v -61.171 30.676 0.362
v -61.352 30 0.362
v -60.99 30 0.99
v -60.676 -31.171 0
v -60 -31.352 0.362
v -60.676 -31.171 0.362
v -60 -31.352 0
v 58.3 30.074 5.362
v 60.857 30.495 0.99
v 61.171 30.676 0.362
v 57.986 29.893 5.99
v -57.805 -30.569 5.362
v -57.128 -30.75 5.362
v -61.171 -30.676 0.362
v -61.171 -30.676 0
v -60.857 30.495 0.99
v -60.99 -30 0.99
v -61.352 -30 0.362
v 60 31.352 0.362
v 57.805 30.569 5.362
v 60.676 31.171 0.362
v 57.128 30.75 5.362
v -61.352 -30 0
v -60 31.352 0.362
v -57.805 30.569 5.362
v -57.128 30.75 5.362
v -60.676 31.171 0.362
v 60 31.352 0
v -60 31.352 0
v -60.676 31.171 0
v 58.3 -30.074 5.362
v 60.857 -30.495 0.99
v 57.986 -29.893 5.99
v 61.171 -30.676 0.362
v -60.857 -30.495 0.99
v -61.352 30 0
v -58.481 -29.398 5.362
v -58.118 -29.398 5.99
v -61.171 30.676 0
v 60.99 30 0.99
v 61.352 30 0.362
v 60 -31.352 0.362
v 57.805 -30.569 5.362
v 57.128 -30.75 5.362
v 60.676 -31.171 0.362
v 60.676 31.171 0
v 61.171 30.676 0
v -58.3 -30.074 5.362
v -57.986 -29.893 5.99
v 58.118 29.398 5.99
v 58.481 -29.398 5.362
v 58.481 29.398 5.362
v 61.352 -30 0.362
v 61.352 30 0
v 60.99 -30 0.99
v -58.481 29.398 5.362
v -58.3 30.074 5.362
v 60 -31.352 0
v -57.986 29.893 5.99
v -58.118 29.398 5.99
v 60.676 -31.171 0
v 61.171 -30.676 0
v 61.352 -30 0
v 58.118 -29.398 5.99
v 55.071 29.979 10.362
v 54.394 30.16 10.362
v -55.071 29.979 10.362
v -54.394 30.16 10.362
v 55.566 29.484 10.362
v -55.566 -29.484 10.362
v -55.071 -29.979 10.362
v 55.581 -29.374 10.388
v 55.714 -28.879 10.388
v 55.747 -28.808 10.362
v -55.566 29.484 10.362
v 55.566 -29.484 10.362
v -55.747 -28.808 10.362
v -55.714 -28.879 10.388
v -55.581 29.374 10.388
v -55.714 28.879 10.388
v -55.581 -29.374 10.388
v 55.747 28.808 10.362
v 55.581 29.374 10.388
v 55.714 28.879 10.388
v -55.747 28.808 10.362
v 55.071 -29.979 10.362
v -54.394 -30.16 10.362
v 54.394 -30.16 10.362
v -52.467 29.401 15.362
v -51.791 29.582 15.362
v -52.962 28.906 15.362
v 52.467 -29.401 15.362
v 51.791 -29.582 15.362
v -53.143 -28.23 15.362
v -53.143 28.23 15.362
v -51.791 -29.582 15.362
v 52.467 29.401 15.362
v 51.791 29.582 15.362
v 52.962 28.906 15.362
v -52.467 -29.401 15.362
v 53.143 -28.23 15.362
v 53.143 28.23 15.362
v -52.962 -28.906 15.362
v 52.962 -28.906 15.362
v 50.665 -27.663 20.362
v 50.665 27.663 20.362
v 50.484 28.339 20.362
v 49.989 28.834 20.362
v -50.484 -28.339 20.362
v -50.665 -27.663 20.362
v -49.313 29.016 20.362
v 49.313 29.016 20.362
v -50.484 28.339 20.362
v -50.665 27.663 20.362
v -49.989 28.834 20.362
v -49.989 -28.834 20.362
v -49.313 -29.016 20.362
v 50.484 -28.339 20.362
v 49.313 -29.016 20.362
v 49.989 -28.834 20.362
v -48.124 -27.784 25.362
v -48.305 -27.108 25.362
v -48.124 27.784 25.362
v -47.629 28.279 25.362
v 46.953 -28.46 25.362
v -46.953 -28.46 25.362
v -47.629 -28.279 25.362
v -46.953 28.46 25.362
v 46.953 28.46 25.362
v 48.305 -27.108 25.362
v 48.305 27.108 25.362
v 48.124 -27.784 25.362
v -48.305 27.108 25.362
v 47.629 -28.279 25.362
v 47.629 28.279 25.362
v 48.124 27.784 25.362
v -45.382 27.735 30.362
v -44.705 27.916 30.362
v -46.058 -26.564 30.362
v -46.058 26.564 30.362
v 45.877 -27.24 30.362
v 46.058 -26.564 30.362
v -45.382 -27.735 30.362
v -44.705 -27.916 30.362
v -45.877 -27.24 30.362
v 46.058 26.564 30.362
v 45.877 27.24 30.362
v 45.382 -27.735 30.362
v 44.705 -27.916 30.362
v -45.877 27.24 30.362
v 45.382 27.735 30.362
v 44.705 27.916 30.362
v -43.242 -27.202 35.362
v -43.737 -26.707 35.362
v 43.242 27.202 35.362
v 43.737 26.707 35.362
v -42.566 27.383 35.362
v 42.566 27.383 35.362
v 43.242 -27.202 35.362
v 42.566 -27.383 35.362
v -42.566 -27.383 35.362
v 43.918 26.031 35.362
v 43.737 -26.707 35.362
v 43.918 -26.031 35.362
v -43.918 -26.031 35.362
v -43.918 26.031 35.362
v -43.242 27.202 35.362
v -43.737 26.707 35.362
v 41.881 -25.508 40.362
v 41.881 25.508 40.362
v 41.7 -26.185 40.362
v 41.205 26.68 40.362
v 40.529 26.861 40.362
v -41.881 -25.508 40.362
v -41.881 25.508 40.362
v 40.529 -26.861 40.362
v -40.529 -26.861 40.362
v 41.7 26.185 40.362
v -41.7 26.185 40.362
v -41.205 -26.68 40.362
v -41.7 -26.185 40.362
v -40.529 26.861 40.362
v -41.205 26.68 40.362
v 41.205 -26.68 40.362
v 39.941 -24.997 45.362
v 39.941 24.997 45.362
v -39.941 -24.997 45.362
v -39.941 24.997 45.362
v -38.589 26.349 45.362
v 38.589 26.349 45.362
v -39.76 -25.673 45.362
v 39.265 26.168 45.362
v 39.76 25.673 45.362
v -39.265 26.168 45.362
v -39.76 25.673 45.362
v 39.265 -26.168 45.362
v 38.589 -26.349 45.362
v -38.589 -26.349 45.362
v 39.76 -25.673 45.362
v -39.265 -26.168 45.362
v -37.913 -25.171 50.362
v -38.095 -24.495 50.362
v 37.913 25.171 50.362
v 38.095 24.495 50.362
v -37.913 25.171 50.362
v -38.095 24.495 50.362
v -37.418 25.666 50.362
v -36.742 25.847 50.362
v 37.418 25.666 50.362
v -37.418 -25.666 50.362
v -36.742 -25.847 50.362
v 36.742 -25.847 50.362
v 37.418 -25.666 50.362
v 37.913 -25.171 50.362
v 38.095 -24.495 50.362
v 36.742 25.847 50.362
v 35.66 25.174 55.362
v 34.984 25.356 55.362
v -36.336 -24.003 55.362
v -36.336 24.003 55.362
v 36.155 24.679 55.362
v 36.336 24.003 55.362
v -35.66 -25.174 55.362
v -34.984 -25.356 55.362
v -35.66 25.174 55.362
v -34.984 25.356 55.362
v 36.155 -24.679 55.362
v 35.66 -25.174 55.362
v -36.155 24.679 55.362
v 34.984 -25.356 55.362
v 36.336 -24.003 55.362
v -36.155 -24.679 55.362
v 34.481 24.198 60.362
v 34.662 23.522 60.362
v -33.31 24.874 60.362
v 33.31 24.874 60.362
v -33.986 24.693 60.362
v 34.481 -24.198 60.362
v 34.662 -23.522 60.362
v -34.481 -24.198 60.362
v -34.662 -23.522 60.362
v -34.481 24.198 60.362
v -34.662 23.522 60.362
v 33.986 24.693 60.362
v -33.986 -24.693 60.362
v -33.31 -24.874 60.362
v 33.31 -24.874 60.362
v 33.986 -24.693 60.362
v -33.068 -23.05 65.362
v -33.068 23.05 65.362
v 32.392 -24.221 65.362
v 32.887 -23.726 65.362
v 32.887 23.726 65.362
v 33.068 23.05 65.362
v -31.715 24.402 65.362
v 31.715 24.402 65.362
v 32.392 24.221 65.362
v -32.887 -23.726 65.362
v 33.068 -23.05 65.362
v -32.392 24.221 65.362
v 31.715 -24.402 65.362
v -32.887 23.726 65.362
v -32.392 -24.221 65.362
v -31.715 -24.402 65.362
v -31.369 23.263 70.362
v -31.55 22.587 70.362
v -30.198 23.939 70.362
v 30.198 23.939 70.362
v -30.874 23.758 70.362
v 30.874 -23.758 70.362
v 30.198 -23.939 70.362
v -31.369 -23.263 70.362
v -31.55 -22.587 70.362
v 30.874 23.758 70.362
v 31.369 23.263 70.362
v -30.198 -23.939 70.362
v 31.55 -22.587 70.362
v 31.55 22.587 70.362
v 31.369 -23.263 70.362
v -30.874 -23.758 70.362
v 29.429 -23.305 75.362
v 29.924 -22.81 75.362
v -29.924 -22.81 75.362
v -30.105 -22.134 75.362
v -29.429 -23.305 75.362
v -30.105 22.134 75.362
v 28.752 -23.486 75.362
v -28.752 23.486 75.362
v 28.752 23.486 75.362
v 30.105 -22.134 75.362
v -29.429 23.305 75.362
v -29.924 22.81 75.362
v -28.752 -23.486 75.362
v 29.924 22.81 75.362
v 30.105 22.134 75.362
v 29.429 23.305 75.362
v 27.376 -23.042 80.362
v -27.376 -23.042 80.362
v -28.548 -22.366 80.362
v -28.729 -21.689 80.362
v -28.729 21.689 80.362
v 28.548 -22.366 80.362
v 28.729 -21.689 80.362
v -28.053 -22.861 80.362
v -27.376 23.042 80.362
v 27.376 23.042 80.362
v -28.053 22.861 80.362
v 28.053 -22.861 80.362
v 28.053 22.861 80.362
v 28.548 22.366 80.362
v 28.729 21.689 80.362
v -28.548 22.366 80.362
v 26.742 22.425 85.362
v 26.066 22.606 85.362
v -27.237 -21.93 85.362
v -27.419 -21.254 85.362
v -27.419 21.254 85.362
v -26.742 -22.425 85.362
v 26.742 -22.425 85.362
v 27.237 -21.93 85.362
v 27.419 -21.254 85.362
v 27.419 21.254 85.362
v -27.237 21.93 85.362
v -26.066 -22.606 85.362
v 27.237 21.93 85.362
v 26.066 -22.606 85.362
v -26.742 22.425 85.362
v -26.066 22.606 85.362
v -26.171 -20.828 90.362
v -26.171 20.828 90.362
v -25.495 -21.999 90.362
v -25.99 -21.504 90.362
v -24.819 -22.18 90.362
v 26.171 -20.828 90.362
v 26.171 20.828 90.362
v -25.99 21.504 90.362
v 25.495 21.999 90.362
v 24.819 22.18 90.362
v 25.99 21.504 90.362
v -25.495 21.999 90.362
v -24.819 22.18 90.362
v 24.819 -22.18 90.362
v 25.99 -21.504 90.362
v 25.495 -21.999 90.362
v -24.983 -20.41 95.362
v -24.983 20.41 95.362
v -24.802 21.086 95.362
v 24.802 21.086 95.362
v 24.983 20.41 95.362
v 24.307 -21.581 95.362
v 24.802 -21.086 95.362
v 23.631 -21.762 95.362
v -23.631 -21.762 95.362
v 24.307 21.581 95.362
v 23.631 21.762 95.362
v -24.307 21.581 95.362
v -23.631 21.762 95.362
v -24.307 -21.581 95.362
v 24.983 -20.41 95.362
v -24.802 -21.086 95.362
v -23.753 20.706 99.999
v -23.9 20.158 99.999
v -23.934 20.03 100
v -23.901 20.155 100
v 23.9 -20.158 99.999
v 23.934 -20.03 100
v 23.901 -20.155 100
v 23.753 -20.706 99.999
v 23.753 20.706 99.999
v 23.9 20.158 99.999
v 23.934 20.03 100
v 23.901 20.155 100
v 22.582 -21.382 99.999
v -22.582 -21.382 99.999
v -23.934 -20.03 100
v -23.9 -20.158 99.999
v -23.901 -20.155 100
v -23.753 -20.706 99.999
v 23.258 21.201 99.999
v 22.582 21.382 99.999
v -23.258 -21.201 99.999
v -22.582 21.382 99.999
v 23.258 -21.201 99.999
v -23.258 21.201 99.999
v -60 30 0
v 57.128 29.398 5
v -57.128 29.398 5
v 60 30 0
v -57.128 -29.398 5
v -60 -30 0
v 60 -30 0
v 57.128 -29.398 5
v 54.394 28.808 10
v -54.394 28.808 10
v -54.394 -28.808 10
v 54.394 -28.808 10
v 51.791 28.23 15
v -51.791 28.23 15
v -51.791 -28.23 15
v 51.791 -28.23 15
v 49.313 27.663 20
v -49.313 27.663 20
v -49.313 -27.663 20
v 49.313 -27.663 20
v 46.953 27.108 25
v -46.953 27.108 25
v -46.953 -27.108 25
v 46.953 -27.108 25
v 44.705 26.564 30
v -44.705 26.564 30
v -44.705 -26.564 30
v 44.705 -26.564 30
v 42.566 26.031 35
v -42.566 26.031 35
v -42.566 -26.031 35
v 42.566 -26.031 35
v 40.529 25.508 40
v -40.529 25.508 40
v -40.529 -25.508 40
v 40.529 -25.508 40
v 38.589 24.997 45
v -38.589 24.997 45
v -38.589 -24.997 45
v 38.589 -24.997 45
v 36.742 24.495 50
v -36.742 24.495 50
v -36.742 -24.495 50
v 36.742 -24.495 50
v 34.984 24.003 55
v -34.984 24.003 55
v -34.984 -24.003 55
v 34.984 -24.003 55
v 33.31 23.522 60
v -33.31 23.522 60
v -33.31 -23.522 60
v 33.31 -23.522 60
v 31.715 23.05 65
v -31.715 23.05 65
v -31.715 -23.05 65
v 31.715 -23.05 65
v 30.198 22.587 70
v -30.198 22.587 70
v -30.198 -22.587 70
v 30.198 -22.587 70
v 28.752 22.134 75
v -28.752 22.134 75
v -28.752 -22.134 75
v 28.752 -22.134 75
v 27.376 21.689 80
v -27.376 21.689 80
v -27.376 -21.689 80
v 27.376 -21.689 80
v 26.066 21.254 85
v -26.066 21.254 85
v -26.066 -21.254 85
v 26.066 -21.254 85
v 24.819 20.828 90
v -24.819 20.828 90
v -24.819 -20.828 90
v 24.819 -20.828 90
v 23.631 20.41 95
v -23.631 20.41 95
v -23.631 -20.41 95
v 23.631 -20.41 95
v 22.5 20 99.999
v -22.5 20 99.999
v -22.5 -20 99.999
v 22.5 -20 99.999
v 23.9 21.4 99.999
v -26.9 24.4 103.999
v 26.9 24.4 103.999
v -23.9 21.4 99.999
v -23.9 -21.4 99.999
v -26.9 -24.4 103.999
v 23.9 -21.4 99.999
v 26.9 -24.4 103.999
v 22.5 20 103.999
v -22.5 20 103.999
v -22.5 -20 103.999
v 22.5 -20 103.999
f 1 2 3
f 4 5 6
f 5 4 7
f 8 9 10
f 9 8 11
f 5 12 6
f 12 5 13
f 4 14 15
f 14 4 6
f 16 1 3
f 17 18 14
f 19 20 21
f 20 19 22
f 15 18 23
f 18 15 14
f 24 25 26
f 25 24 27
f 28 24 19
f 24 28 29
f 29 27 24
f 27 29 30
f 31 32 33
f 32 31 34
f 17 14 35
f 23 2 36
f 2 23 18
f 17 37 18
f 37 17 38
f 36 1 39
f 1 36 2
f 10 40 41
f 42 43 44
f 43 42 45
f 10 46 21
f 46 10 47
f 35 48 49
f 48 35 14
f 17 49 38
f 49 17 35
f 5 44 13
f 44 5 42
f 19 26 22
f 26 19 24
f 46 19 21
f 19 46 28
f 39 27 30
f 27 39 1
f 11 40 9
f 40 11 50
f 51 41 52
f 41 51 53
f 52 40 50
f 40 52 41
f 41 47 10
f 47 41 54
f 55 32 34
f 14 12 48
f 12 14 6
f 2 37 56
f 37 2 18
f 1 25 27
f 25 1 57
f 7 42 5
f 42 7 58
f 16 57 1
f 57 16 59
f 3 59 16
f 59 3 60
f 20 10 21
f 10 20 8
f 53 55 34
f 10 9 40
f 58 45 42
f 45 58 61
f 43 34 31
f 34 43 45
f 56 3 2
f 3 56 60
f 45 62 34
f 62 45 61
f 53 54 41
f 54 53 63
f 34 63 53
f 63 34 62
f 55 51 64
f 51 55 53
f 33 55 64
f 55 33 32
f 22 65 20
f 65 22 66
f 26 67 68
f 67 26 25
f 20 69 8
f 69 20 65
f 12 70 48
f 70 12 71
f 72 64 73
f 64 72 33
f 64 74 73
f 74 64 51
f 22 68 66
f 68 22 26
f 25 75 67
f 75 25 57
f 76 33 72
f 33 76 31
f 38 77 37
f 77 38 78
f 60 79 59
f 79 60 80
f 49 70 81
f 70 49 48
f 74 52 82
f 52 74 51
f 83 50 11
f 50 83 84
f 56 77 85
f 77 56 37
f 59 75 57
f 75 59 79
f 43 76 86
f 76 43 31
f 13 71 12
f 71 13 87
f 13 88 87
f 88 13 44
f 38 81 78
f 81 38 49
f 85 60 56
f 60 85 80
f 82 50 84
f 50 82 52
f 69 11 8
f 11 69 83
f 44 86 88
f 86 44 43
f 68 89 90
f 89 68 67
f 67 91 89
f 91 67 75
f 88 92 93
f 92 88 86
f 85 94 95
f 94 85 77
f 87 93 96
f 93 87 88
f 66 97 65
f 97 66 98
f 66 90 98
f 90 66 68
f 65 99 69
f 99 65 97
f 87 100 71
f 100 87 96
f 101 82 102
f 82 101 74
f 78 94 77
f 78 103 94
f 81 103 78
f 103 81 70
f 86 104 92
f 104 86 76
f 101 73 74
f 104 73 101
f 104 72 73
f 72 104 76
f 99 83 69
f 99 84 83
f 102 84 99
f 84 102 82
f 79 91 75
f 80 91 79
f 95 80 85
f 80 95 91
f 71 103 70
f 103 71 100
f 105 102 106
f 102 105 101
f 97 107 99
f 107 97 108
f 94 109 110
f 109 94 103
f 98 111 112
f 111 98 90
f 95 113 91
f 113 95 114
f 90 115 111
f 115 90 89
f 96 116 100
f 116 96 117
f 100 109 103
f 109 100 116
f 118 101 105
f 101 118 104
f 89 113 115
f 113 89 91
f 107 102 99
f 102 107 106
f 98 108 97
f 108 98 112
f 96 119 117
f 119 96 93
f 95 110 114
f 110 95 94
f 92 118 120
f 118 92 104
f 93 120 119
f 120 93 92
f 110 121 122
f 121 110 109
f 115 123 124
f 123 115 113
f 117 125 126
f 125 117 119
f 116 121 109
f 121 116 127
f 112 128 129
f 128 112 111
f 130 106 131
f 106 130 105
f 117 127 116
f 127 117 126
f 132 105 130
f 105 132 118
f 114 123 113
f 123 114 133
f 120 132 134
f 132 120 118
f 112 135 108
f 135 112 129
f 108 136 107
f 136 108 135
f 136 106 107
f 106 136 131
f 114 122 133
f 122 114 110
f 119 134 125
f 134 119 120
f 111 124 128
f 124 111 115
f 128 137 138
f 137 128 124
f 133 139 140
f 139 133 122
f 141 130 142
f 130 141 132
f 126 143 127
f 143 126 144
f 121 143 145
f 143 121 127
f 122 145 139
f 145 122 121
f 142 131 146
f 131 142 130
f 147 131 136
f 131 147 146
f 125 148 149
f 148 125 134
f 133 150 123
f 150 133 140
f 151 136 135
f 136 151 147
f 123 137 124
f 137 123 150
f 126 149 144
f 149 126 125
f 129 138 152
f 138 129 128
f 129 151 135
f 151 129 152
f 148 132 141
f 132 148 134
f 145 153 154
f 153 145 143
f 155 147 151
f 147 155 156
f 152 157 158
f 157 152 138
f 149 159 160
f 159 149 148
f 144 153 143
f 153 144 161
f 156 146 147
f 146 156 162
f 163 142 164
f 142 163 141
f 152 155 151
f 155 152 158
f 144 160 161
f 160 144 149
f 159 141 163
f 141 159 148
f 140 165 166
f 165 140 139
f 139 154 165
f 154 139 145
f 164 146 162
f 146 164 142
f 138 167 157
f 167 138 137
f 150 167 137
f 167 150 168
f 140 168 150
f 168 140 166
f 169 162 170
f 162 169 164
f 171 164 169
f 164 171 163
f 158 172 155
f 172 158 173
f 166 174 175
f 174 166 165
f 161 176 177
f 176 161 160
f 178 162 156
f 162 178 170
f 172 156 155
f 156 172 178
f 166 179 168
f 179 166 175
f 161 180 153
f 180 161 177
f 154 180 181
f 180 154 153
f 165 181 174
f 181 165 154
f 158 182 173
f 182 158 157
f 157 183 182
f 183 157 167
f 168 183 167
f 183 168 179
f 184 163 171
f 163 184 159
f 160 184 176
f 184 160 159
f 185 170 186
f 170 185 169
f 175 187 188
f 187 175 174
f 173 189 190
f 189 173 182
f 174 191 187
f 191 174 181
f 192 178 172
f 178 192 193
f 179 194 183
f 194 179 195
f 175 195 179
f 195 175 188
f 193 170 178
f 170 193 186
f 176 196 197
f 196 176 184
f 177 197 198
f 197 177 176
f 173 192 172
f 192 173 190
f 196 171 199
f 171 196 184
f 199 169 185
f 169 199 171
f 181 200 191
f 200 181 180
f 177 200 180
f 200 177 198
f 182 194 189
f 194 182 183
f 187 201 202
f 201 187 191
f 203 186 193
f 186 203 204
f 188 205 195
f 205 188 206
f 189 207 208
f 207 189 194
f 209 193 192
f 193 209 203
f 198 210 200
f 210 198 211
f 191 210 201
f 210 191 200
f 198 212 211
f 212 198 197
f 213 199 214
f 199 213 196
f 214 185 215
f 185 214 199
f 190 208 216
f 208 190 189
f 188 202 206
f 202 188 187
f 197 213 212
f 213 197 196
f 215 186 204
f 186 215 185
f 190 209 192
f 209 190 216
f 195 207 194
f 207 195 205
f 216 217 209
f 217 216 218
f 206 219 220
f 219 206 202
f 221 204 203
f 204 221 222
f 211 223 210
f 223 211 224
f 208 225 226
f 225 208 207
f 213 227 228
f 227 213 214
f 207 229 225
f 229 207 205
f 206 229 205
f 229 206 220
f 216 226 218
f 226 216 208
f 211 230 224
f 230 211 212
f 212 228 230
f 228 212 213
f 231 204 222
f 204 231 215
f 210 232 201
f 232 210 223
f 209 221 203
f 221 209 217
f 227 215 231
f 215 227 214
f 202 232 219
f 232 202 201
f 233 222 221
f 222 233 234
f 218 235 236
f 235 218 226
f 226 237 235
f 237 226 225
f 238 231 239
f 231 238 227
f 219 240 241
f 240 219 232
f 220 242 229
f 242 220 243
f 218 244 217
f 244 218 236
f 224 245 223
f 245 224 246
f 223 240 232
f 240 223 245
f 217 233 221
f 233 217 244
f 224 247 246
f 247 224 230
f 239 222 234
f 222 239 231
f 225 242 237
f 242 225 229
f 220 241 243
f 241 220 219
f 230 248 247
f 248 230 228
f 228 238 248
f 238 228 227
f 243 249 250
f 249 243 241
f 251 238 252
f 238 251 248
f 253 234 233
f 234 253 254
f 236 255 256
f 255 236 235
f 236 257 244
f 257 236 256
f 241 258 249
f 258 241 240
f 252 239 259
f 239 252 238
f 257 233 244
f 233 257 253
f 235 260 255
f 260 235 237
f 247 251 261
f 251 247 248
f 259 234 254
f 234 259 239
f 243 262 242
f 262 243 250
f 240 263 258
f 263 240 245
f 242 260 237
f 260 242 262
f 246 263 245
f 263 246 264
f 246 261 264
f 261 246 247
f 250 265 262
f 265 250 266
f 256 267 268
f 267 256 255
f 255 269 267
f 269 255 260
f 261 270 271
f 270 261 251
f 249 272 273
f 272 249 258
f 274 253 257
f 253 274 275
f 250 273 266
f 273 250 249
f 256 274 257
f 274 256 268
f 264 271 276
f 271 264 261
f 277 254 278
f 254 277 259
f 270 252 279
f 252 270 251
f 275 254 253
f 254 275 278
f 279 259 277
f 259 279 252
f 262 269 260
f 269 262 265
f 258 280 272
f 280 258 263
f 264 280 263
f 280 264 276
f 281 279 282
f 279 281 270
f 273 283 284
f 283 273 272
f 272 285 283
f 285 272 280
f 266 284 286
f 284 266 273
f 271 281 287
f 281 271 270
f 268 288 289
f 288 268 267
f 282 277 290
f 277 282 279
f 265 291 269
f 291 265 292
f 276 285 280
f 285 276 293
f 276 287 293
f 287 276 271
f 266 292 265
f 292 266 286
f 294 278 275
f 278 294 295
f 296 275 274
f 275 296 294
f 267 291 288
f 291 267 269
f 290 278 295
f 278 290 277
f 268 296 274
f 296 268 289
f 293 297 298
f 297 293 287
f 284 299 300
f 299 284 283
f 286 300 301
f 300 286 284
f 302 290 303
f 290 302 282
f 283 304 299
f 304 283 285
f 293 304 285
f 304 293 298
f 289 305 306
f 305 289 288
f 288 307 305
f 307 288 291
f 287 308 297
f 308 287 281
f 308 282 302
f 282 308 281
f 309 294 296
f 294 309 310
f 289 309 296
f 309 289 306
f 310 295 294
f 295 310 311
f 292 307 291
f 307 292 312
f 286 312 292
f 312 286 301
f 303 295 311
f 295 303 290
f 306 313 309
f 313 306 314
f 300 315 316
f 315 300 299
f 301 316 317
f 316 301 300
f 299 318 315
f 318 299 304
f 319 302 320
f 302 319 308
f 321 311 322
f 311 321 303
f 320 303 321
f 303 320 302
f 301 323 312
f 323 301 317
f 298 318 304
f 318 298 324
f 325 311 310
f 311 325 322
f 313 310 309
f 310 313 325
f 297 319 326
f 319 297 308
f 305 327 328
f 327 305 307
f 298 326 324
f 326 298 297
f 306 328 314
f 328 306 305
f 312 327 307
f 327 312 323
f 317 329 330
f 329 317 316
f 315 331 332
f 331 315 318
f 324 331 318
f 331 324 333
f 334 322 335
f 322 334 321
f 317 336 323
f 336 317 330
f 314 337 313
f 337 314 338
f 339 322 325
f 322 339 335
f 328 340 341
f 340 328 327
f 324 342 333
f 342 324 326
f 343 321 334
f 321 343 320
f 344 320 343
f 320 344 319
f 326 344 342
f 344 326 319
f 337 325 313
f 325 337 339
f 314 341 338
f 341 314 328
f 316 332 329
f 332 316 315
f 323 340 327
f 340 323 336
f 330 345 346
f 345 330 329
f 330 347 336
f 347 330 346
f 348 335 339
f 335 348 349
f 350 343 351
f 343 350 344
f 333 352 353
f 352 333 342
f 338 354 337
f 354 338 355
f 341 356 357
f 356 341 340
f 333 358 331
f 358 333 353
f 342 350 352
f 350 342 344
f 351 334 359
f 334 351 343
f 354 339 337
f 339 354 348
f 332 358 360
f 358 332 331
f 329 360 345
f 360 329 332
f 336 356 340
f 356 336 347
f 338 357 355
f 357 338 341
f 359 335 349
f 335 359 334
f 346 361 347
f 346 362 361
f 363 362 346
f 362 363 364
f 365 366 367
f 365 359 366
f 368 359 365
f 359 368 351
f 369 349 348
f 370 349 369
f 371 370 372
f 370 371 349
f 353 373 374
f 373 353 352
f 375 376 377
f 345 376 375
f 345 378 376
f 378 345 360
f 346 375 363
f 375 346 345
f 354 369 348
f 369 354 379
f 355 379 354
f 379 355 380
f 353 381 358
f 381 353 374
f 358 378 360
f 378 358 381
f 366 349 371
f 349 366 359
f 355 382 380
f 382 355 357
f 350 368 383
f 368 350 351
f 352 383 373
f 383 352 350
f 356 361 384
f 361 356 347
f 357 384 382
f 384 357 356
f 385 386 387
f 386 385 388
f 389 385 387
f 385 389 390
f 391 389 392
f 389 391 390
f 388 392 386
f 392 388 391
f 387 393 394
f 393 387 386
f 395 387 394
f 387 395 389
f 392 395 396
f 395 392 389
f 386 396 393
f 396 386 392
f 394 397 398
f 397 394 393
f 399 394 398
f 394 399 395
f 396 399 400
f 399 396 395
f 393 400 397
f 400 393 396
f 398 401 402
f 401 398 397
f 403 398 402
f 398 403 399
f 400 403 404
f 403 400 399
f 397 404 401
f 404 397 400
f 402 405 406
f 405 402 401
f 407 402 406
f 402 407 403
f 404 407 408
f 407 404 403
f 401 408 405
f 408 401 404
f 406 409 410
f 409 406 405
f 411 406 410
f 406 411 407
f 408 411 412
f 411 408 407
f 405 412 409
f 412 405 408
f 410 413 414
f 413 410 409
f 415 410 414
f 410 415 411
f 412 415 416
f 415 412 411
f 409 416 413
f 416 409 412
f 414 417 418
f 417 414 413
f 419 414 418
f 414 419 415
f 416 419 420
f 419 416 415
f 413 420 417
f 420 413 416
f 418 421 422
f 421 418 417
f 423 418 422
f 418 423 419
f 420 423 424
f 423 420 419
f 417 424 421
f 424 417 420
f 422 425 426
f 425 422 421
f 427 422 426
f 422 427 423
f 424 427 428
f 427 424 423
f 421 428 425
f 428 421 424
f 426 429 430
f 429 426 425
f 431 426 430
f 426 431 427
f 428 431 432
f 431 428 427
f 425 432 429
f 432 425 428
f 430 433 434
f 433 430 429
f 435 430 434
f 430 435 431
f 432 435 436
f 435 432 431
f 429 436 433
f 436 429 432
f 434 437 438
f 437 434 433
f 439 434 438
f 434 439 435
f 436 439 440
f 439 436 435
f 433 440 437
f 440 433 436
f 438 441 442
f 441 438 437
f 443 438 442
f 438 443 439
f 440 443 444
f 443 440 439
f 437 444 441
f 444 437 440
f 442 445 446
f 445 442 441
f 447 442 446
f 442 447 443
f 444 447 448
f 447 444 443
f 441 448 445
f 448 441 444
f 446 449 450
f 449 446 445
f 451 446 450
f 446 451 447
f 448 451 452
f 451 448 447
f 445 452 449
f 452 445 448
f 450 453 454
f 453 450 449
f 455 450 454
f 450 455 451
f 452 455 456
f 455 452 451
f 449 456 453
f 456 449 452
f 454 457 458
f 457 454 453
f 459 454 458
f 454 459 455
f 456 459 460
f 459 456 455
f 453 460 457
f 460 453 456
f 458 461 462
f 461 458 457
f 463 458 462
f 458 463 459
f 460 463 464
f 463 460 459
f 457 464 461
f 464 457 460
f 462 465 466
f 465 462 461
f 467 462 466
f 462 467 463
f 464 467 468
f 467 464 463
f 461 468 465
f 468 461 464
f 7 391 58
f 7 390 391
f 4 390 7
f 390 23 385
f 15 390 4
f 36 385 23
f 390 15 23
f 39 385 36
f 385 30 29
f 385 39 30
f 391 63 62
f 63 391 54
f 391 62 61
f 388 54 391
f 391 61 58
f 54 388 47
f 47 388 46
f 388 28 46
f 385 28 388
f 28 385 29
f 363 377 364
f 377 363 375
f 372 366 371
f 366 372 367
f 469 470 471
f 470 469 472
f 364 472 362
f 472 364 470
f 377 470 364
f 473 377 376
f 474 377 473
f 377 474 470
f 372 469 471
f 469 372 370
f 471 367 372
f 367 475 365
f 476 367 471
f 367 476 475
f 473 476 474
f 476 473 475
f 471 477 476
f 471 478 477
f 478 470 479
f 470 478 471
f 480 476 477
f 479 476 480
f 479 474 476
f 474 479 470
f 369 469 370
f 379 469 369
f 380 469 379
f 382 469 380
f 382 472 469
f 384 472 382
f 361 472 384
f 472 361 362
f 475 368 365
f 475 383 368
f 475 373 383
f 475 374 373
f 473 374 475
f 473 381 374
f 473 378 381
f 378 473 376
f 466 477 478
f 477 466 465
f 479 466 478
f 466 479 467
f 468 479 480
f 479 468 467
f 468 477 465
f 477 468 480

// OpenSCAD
length = 100;
throatWidth = 45;
throatHeight = 40;
mouthWidth = 120;
mouthHeight = 60;
wallThickness = 1.4;
numSections = 20;
flangeLength = 4;
flangeFlare = 3;
rectangular = 1; // [1:yes, 0:no]

module end_of_parameters_dummy() {}

//use <horn.scad>;
//use <tubemesh.scad>;
// params = [sections,sectionCounts]

// written for tail-recursion
// _subtotals[i] = list[0] + ... + list[i-1]
function _subtotals(list,soFar=[]) =
        len(soFar) >= 1+len(list) ? soFar :
        _subtotals(list,
            let(n1=len(soFar))
            concat(soFar, n1>0 ? soFar[n1-1]+list[n1-1] : 0));

function _flatten(list) = [for (a=list) for(b=a) b];

function _reverseTriangle(t) = [t[2], t[1], t[0]];

// smallest angle in triangle
function _minAngle(p1,p2,p3) =
    let(a = p2-p1,
        b = p3-p1,
        c = p3-p2,
        v1 = a*b,
        v2 = -(c*a))
        v1 == 0 || v2 == 0 ? 0 :
        let( na = norm(a),
             a1 = acos(v1 / (na*norm(b))),
             a2 = acos(v2 / (na*norm(c))) )
        min(a1,a2,180-(a1+a2));

// triangulate square to maximize smallest angle
function _doSquare(points,i11,i21,i22,i12,optimize=true) =
    points[i11]==points[i12] ? [[i11,i21,i22]] :
    points[i21]==points[i22] ? [[i22,i12,i11]] :
    !optimize ? [[i11,i21,i22], [i22,i12,i11]] :
    let (m1 = min(_minAngle(points[i11],points[i21],points[i22]), _minAngle(points[i22],points[i12],points[i11])),
        m2 = min(_minAngle(points[i11],points[i21],points[i12]),
                _minAngle(points[i21],points[i22],points[i12])) )
        m2 <= m1 ? [[i11,i21,i22], [i22,i12,i11]] :
                  [[i11,i21,i12], [i21,i22,i12]];

/*
function _inTriangle(v1,t) = (v1==t[0] || v1==t[1] || v1==t[2]);

function _findTheDistinctVertex(t1,t2) =
    let(in = [for(i=[0:2]) _inTriangle(t1[i],t2)])
    ! in[0] && in[1] && in[2] ? 0 :
    ! in[1] && in[0] && in[2] ? 1 :
    ! in[2] && in[0] && in[1] ? 2 :
    undef;

// make vertex i come first
function _rotateTriangle(t,i) =
    [for (j=[0:2]) t[(j+i)%3]];

function _optimize2Triangles(points,t1,t2) =
    let(i1 = _findTheDistinctVertex(t1,t2))
    i1 == undef ? [t1,t2] :
    let(i2 = _findTheDistinctVertex(t2,t1))
    i2 == undef ? [t1,t2] :
    let(t1 = _rotateTriangle(t1,i1),
        t2 = _rotateTriangle(t2,i2))
    _doSquare(points,t1[1],t2[0],t2[1],t1[0],optimize=true);

// a greedy optimization for a strip of triangles most of which adjoin one another; written for tail-recursion
function _optimizeTriangles(points,triangles,position=0,optimize=true,iterations=4) =
        !optimize || position >= iterations*len(triangles) ? triangles :
            _optimizeTriangles(points,
                let(
                    n = len(triangles),
                    position1=position%n,
                    position2=(position+1)%n,
                    opt=_optimize2Triangles(points,triangles[position1],triangles[position2]))
                    [for (i=[0:len(triangles)-1])
                        i == position1 ? opt[0] :
                        i == position2 ? opt[1] :
                            triangles[i]],
                position=position+1);
*/

function _removeEmptyTriangles(points,triangles) =
    [for(t=triangles)
        if(true || points[t[0]] != points[t[1]] && points[t[1]] != points[t[2]] && points[t[2]] != points[t[0]]) t];

// n1 and n2 should be fairly small, so this doesn't need
// tail-recursion
// this assumes n1<=n2
function _tubeSegmentTriangles(points,index1,n1,index2,n2,i=0,soFar=[],optimize=true)
    = i>=n2 ? _removeEmptyTriangles(points,soFar) :
            let(i21=i,
                i22=(i+1)%n2,
                i11=floor((i21)*n1/n2+0.5)%n1,
                i12=floor((i22)*n1/n2+0.5)%n1,
                add = i11==i12 ? [[index1+i11,index2+i21,index2+i22]] :
                    _doSquare(points,index1+i11,index2+i21,index2+i22,index1+i12,optimize=optimize))
                _tubeSegmentTriangles(points,index1,n1,index2,n2,i=i+1,soFar=concat(soFar,add),optimize=optimize);

function _tubeSegmentFaces(points,index,n1,n2,optimize=true)
    = n1<n2 ? _tubeSegmentTriangles(points,index,n1,index+n1,n2,optimize=optimize) :
        [for (f=_tubeSegmentTriangles(points,index+n1,n2,index,n1,optimize=optimize)) _reverseTriangle(f)];

function _tubeMiddleFaces(points,counts,subtotals,optimize=true) = [ for (i=[1:len(counts)-1])
           for (face=_tubeSegmentFaces(points,subtotals[i-1],counts[i-1],counts[i],optimize=optimize)) face ];

function _endCaps(counts,subtotals,startCap=true,endCap=true) =
    let( n = len(counts),
         cap1 = counts[0]<=2 || !startCap ? undef : [for(i=[0:counts[0]-1]) i],
         cap2 = counts[n-1]<=2 || !endCap ? undef : [for(i=[counts[n-1]-1:-1:0]) subtotals[n-1]+i] )
       [for (c=[cap1,cap2]) if (c!=undef) c];

function _tubeFaces(sections,startCap=true,endCap=true,optimize=true) =
                let(
        counts = [for (s=sections) len(s)],
        points = _flatten(sections),
        subtotals = _subtotals(counts))
            concat(_tubeMiddleFaces(points,counts,subtotals,optimize=optimize),_endCaps(counts,subtotals,startCap=true,endCap=true));

function _removeDuplicates1(points,soFar=[[],[]]) =
        len(soFar[0]) >= len(points) ? soFar :
            _removeDuplicates1(points,
               let(
                mapSoFar=soFar[0],
                pointsSoFar=soFar[1],
                j=len(mapSoFar),
                k=search([points[j]], pointsSoFar)[0])
                k == []? [concat(mapSoFar,[len(pointsSoFar)]),
                            concat(pointsSoFar,[points[j]])] :
                           [concat(mapSoFar,[k]),pointsSoFar]);

function _removeDuplicates(points, faces) =
    let(fix=_removeDuplicates1(points),
        map=fix[0],
        newPoints=fix[1],
        newFaces=[for(f=faces) [for(v=f) map[v]]])
            [newPoints, newFaces];

function pointsAndFaces(sections,startCap=true,endCap=true,optimize=true) =
        let(
            points0=_flatten(sections),
            faces0=_tubeFaces(sections,startCap=startCap,endCap=endCap,optimize=optimize)) [points0,faces0];
//        _removeDuplicates(points0,faces0);

// increase number of points from len(section) to n
function _interpolateSection(section,n) =
        let(m=len(section))
        n == m ? section :
        n < m ? undef :
            [for(i=[0:m-1])
                let(cur=floor(i*n/m),
                    k=floor((i+1)*n/m)-cur,
                    i2=(i+1)%m)
                    for(j=[0:k-1])
                        let(t=j/k)
                            section[i]*(1-t)+section[i2]*t];

function ngonPoints(n=4,r=10,d=undef,rotate=0,z=undef) =
            let(r=d==undef?r:d/2)
            z==undef ?
            r*[for(i=[0:n-1]) let(angle=i*360/n+rotate) [cos(angle),sin(angle)]] :
            [for(i=[0:n-1]) let(angle=i*360/n+rotate) [r*cos(angle),r*sin(angle),z]];

function starPoints(n=10,r1=5,r2=10,rotate=0,z=undef) =
          z==undef ?
            [for(i=[0:2*n-1]) let(angle=i*180/n+rotate) (i%2?r1:r2) * [cos(angle),sin(angle)]] :
            [for(i=[0:2*n-1]) let(angle=i*180/n+rotate, r=i%2?r1:r2) [r*cos(angle),r*sin(angle),z]];

// warning: no guarantee of perfect convexity
module mySphere(r=10,d=undef) {
    GA = 2.39996322972865332 * 180 / PI;
    radius = d==undef ? r : d/2;
    pointsAround =
        $fn ? $fn :
        max(3, floor(0.5+360/$fa), floor(0.5+2*radius*PI/$fs));
    numSlices0 = (pointsAround + pointsAround % 2)/2;
    numSlices = numSlices0 + (numSlices0%2);
    sections = radius*[for(i=[0:numSlices])
                    i == 0 ? [[0,0,-1]] :
                    i == numSlices ? [[0,0,1]] :
                    let(
                        lat = (i-numSlices/2)/(numSlices/2)*90,
                        z1 = sin(lat),
                        r1 = cos(lat),
                        count = max(3,floor(0.5 + pointsAround * abs(r1))))
                        ngonPoints(count,r=r1,z=z1)];
    data = pointsAndFaces(sections,optimize=false);
    polyhedron(points=data[0], faces=data[1]);
}

module morphExtrude(section1,section2,height=undef,twist=0,numSlices=10,startCap=true,endCap=true,optimize=false) {
    n = max(len(section1),len(section2));

    section1interp = _interpolateSection(section1,n);
    section2interp = _interpolateSection(section2,n);
    sections = height == undef ?
                      [for(i=[0:numSlices])
                        let(t=i/numSlices)
                        (1-t)*section1interp+t*section2interp] :
                      [for(i=[0:numSlices])
                        let(t=i/numSlices,
                            theta = t*twist,
                            section=(1-t)*section1interp+t*section2interp)
                        [for(p=section) [p[0]*cos(theta)-p[1]*sin(theta),p[0]*sin(theta)+p[1]*cos(theta),height*t]]];

    data = pointsAndFaces(sections,startCap=startCap,endCap=endCap,optimize=false);
    polyhedron(points=data[0], faces=data[1]);
}

module cone(r=10,d=undef,height=10) {
    radius = d==undef ? r : d/2;
    pointsAround =
        $fn ? $fn :
        max(3, floor(0.5+360/$fa), floor(0.5+2*radius*PI/$fs));
    morphExtrude(ngonPoints(n=pointsAround,r=radius), [[0,0]], height=height,optimize=false);
}

module prism(base=[[0,0,0],[1,0,0],[0,1,0]], vertical=[0,0,1]) {
    morphExtrude(base,[for(v=base) v+vertical],numSlices=1);
}

//use <roundedsquare.scad>;
module roundedSquare(size=[10,10], radius=1, center=false, $fn=16) {
    size1 = (size+0==size) ? [size,size] : size;
    if (radius <= 0) {
        square(size1, center=center);
    }
    else {
        translate(center ? -size1/2 : [0,0])
        hull() {
            translate([radius,radius]) circle(r=radius);
            translate([size1[0]-radius,radius]) circle(r=radius);
            translate([size1[0]-radius,size1[1]-radius]) circle(r=radius);
            translate([radius,size1[1]-radius]) circle(r=radius);
        }
    }
}

module roundedOpenTopBox(size=[10,10,10], radius=2, wall=1, solid=false) {
    render(convexity=2)
    difference() {
        linear_extrude(height=size[2]) roundedSquare(size=[size[0],size[1]], radius=radius);
        if (!solid) {
            translate([0,0,wall])
            linear_extrude(height=size[2]-wall)
            translate([wall,wall]) roundedSquare(size=[size[0]-2*wall,size[1]-2*wall], radius=radius-wall);
        }
    }
}

module dummy(){}

module horn(throat=[45,40], mouth=[120,60], length=100, wallThickness=1.4, numSections=20, flangeLength=4, flangeFlare=3, rectangular=true, solidFlangeOnly=false) {

    function getExponent(ratio) = pow(ratio, 1/length);

    mouthWidth = len(mouth)==2 ? mouth[0] : mouth;
    mouthHeight = len(mouth)==2 ? mouth[1] : mouth;
    throatWidth = len(throat)==2 ? throat[0] : throat;
    throatHeight = len(throat)==2 ? throat[1] : throat;

    wExp = getExponent(mouthWidth/throatWidth);
    hExp = getExponent(mouthHeight/throatHeight);

    function section(x,y,z) =
        rectangular ?
            [ [x,y,z], [-x,y,z], [-x,-y,z], [x,-y,z] ]:
            [ for(t=[0:10:350]) [x*cos(t), y*sin(t), z]];

    sections =
        [ for(i=[0:numSections])
            let(z=i/numSections*length,
                x=pow(wExp,length-z)*throatWidth/2,
                y=pow(hExp,length-z)*throatHeight/2)
            section(x,y,z) ];

    module hornShape() {
        data = pointsAndFaces(sections,startCap=true,endCap=true,optimize=true);
        polyhedron(points=data[0], faces=data[1]);
    }

/*    module hornShellQuick() {
        render(convexity=2)
        difference() {
            scale([(mouthWidth+wallThickness*2)/mouthWidth,(mouthHeight+wallThickness*2)/mouthHeight,1]) hornShape();
        }
    } */

    module hornShellGood() {
        render(convexity=2)
        intersection() {
            difference() {
                minkowski() {
                    hornShape();
                    sphere(r=wallThickness,$fn=12);
                }
                hornShape();
            }
            translate([-mouthWidth/2-wallThickness,-mouthHeight/2-wallThickness,0])
            cube([mouthWidth+2*wallThickness,mouthHeight+2*wallThickness,length]);
        }
    }

    module flange(hollow=true) {
        if (flangeLength>0) {
            x1 = throatWidth/2+wallThickness;
            y1 = throatHeight/2+wallThickness;
            x2 = x1 + flangeFlare;
            y2 = y1 + flangeFlare;
            render(convexity=2)
            difference() {
                morphExtrude(section(x1,y1,0), section(x2,y2,flangeLength),numSlices=1);
                if (hollow)
                    morphExtrude(section(throatWidth/2,throatHeight/2,-1), section(throatWidth/2,throatHeight/2,flangeLength+1),numSlices=1);
            }
        }
    }

    if (!solidFlangeOnly)
        hornShellGood();
    translate([0,0,solidFlangeOnly?0:length-0.001]) flange(hollow=!solidFlangeOnly);
}


horn(length=length, throat=[throatWidth,throatHeight], mouth=[mouthWidth,mouthHeight], wallThickness=wallThickness, numSections=numSections, flangeLength=flangeLength, flangeFlare=flangeFlare, rectangular=rectangular);
